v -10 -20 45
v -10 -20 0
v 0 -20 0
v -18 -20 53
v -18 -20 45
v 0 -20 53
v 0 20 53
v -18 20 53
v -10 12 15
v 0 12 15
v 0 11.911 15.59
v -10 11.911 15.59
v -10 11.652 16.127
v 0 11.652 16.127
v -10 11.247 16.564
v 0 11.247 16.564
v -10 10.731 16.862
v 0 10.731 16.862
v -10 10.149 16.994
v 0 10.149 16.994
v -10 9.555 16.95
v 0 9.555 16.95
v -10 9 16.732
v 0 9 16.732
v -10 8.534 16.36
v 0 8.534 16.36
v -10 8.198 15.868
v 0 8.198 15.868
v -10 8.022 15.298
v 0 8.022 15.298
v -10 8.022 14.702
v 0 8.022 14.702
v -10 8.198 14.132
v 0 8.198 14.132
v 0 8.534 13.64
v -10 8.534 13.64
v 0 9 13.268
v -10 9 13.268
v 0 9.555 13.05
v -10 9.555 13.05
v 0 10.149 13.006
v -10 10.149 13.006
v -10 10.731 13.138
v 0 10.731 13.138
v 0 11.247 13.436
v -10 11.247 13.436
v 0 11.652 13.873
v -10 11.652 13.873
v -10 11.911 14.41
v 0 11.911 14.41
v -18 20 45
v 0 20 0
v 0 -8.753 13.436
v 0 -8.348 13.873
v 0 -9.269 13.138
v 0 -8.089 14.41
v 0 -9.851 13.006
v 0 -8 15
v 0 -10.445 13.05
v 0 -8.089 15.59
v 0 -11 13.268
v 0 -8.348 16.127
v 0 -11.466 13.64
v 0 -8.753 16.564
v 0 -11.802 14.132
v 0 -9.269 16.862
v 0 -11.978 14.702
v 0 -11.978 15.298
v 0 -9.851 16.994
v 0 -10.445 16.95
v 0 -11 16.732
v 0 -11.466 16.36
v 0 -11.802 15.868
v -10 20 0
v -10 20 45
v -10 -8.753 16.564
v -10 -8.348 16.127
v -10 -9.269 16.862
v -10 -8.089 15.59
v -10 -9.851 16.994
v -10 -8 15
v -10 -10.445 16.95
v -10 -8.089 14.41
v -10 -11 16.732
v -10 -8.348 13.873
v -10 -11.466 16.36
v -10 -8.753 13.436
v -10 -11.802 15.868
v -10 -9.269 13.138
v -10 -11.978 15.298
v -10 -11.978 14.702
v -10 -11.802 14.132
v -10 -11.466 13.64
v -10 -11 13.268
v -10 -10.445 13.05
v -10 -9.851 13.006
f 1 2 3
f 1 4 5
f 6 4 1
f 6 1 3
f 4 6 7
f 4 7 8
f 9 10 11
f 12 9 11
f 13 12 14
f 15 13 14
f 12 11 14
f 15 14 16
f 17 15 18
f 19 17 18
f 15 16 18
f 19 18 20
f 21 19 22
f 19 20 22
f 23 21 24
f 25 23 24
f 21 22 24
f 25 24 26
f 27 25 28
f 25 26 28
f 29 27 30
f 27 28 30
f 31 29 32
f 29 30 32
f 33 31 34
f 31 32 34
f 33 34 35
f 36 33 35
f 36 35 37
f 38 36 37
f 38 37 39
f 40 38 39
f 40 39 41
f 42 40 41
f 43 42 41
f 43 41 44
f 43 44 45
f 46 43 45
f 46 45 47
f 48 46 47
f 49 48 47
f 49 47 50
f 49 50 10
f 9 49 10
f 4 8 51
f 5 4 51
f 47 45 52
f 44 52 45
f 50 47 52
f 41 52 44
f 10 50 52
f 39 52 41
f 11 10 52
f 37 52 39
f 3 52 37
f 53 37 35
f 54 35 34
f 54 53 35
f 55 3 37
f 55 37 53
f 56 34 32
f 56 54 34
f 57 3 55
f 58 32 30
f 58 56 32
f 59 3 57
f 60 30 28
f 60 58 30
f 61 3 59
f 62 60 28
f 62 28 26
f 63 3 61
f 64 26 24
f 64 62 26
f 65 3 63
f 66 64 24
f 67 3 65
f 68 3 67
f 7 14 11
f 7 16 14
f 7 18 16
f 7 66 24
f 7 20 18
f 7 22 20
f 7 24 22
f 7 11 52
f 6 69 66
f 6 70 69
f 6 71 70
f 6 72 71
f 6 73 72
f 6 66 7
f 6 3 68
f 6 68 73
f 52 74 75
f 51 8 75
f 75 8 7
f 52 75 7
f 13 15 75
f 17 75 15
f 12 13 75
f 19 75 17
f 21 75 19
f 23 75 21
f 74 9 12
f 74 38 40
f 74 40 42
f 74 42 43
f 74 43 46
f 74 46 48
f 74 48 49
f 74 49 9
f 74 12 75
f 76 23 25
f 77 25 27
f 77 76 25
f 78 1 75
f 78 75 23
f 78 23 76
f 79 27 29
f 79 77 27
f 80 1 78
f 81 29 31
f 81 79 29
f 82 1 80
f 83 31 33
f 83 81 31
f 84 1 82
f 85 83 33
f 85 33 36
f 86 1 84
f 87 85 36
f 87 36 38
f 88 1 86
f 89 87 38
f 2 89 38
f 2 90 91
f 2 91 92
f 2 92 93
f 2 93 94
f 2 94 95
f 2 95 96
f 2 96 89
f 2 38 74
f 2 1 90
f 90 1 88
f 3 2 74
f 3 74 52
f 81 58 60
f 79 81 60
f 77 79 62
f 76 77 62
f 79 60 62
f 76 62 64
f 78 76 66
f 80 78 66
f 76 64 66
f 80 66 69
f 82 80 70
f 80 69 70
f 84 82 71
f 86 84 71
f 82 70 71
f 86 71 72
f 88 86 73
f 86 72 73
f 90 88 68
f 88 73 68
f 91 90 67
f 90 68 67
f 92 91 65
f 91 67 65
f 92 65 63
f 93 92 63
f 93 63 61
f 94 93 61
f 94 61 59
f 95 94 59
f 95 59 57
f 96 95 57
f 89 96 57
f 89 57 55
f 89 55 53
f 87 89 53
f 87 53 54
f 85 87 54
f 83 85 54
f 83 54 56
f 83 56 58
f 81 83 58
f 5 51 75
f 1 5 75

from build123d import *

# Parameters (mm, degrees)
F1_DEPTH = 20
F2_R     = 2
F3_DEPTH = 18.001


with BuildPart() as f1:
    # F0 (on Front) → F1 (new body, symmetric)
    with BuildSketch(Plane.XZ):
        Polygon((-10, 45), (-10, 0), (0, 0), (0, 53), (-18, 53), (-18, 45), align=None)
    extrude(amount=F1_DEPTH, both=True)

    # F2 (on face) → F3 (cut, through all)
    with BuildSketch(Plane.YZ):
        with Locations((-10, 15)):
            Circle(F2_R)
        with Locations((10, 15)):
            Circle(F2_R)
    extrude(amount=-F3_DEPTH, mode=Mode.SUBTRACT)


solid = f1.part
